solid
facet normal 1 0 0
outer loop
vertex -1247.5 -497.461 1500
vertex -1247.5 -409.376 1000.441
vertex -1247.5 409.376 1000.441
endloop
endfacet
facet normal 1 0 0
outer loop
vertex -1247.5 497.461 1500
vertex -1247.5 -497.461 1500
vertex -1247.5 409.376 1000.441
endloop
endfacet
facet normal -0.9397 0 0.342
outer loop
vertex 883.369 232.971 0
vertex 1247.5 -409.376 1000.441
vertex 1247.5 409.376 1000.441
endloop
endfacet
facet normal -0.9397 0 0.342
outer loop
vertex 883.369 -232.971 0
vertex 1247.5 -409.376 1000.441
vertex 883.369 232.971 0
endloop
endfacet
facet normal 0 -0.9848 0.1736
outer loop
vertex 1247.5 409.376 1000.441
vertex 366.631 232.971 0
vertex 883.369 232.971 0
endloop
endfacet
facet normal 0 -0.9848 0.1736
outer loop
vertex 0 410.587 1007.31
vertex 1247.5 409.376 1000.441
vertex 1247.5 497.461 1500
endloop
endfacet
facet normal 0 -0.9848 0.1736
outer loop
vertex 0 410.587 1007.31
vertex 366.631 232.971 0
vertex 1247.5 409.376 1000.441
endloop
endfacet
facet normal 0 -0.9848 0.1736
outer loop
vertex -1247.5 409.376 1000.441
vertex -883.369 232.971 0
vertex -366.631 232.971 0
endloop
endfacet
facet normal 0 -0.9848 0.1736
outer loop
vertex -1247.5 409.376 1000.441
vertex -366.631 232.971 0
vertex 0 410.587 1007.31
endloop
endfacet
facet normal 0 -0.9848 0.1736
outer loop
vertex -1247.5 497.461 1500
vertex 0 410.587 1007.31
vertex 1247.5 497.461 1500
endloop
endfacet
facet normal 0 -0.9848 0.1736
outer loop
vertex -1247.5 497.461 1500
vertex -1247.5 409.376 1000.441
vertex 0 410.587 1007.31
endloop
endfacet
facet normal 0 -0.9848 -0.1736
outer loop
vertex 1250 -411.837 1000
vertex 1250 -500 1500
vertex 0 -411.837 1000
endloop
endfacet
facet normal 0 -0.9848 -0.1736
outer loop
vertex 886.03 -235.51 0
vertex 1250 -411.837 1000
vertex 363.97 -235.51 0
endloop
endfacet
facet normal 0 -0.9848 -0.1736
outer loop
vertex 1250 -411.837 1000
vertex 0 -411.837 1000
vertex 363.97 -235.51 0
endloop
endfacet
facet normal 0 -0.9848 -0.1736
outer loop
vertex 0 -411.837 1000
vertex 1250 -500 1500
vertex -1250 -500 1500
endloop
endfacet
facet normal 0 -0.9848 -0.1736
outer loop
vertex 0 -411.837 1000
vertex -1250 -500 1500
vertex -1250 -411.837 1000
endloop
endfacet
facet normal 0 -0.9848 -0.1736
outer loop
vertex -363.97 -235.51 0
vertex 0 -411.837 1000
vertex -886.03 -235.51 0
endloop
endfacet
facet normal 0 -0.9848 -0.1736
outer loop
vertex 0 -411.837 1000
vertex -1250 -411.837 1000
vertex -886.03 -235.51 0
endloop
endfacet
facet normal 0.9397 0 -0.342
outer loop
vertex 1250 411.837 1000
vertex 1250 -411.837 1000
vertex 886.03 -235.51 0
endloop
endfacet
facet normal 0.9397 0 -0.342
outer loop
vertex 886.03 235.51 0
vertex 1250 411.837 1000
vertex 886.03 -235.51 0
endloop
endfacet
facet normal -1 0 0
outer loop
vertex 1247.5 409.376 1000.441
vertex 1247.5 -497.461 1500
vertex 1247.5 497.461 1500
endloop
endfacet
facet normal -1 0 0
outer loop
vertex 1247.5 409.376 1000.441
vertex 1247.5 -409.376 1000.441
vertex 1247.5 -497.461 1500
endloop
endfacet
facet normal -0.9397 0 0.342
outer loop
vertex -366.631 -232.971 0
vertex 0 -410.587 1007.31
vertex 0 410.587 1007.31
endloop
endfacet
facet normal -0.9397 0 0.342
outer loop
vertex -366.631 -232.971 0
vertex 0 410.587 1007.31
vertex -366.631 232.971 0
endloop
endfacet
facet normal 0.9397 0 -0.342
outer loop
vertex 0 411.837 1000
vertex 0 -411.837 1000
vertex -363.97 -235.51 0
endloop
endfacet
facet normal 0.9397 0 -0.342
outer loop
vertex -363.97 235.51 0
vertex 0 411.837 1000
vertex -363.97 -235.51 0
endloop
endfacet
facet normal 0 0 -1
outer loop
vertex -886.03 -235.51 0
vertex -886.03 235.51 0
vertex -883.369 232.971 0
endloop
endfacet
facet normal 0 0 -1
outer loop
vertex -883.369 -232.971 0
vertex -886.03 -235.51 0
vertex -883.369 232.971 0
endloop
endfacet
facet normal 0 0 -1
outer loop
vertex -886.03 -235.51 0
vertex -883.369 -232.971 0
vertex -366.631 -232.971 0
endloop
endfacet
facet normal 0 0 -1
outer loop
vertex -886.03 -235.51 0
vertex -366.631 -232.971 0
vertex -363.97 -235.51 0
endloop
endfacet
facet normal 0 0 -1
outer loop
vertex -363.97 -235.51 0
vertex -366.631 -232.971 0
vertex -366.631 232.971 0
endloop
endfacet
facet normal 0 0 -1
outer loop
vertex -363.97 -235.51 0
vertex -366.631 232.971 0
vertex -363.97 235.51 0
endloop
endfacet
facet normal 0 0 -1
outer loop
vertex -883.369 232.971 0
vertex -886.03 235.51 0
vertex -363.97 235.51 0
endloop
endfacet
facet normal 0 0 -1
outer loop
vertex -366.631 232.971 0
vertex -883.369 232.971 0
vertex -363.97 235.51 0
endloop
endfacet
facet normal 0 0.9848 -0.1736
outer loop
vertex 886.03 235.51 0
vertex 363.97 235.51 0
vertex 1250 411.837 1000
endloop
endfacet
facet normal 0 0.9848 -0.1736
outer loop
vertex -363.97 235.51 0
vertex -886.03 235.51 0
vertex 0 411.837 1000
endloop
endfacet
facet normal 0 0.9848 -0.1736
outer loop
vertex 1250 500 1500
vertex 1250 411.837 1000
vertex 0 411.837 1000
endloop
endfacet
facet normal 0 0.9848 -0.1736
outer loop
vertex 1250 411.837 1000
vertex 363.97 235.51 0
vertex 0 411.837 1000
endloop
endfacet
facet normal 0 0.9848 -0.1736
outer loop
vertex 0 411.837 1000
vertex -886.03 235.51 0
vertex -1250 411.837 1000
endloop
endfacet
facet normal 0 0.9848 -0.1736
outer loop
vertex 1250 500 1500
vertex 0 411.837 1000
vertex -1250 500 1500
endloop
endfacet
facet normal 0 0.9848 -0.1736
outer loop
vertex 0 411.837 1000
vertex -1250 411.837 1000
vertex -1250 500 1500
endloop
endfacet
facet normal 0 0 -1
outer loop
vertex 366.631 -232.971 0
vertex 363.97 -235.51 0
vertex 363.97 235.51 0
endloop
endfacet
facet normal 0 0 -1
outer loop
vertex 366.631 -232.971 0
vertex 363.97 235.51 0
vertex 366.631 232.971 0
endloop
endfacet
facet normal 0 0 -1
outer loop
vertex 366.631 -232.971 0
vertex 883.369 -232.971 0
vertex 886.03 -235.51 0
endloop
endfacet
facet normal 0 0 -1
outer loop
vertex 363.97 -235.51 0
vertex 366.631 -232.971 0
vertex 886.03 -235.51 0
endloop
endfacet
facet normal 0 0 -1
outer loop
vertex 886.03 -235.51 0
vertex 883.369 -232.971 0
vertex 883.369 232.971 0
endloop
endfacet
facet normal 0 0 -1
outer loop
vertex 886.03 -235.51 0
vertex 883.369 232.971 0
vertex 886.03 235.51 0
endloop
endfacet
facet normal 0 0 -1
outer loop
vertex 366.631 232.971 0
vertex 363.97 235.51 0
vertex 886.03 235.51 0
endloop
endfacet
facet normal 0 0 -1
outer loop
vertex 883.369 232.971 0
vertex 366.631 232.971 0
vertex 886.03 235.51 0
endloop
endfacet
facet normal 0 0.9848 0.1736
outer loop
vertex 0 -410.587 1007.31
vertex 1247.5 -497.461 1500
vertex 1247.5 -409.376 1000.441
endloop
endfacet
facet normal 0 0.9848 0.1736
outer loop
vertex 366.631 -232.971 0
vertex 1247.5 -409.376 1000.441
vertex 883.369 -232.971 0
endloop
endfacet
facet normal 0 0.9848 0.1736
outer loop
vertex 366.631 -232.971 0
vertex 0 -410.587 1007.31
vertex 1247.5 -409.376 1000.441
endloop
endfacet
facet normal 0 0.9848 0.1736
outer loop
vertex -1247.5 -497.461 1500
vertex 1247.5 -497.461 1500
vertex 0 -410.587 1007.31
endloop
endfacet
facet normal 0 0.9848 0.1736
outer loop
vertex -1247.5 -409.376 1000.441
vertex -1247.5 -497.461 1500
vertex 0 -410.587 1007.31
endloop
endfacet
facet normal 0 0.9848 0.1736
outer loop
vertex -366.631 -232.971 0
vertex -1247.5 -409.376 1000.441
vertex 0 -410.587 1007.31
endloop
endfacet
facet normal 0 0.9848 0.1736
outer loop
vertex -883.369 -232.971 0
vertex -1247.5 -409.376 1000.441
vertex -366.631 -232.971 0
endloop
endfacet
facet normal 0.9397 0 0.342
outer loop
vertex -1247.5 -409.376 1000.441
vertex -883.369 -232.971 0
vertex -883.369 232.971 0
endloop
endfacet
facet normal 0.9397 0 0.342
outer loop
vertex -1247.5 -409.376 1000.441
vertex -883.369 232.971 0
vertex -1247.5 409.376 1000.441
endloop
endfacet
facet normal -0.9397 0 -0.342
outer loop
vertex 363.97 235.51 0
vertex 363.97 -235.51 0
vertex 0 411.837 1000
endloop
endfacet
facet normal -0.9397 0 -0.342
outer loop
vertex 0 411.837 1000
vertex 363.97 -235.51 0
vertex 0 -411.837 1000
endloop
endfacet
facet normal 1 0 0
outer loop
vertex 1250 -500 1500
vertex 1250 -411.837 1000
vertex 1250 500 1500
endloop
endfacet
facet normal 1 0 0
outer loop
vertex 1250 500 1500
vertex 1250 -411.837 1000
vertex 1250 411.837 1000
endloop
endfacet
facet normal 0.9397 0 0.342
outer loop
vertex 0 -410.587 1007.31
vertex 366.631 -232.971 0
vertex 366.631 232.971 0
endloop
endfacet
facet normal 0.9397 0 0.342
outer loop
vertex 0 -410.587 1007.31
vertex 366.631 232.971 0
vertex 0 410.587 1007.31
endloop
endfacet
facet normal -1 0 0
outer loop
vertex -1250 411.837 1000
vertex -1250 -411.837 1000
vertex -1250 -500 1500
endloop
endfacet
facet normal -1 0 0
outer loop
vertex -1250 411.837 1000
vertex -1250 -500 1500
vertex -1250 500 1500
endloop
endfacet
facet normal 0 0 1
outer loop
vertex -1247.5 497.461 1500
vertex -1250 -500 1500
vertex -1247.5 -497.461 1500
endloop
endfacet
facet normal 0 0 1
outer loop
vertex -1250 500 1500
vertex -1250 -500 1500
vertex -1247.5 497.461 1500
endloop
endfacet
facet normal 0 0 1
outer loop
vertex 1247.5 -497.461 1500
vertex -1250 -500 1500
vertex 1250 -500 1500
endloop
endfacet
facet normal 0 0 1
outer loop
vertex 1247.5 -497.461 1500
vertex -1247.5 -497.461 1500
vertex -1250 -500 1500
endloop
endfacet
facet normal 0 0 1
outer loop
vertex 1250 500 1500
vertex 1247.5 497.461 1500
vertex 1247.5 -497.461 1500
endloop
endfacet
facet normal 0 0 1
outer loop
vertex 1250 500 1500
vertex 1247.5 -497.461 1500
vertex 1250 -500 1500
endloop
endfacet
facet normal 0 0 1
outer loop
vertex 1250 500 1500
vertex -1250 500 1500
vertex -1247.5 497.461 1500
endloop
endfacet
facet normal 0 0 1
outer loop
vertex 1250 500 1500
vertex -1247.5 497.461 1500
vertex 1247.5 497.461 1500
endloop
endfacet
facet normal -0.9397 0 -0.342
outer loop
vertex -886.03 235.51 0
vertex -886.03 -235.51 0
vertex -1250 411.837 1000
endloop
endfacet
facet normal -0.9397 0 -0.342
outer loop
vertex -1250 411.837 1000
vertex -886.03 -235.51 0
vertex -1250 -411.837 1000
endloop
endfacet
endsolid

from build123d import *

# Parameters (mm, degrees)
F0_W     = 2500
F0_H     = 1000
F1_DEPTH = 1500
F3_DEPTH = 1000.001
F5_DEPTH = 2500.001
F6_T     = -2.5


with BuildPart() as f1:
    # F0 (on Top) → F1 (new body)
    with BuildSketch(Plane.XY):
        Rectangle(F0_W, F0_H)
    extrude(amount=F1_DEPTH)

    # F2 (on face) → F3 (cut, through all)
    with BuildSketch(Plane.XZ.offset(500)):
        Polygon((-886.0297657338, 0), (-1250, 1000), (-1250, 0), align=None)
        Polygon((0, 1000), (-363.9702342662, 0), (363.9702342662, 0), align=None)
        Polygon((1250, 0), (1250, 1000), (886.0297657338, 0), align=None)
    extrude(amount=-F3_DEPTH, mode=Mode.SUBTRACT)

    # F4 (on face) → F5 (cut, through all)
    with BuildSketch(Plane(origin=(-1250, 0, 0), x_dir=(0, -1, 0), z_dir=(-1, 0, 0))):
        Polygon((-235.5095289373, 0), (-411.8365096458, 1000), (-500, 1000), (-500, 0), align=None)
        Polygon((-411.8365096458, 1000), (-500, 1500), (-500, 1000), align=None)
        Polygon((500, 1000), (411.8365096458, 1000), (235.5095289373, 0), (500, 0), align=None)
        Polygon((500, 1000), (500, 1500), (411.8365096458, 1000), align=None)
    extrude(amount=-F5_DEPTH, mode=Mode.SUBTRACT)

    # F6
    f6_openings = [f1.faces().sort_by_distance(p)[0] for p in [
        (0, 0, 1500),
        (-625, 0, 0),
        (625, 0, 0),
    ]]
    offset(amount=F6_T, openings=f6_openings, kind=Kind.INTERSECTION)


solid = f1.part
